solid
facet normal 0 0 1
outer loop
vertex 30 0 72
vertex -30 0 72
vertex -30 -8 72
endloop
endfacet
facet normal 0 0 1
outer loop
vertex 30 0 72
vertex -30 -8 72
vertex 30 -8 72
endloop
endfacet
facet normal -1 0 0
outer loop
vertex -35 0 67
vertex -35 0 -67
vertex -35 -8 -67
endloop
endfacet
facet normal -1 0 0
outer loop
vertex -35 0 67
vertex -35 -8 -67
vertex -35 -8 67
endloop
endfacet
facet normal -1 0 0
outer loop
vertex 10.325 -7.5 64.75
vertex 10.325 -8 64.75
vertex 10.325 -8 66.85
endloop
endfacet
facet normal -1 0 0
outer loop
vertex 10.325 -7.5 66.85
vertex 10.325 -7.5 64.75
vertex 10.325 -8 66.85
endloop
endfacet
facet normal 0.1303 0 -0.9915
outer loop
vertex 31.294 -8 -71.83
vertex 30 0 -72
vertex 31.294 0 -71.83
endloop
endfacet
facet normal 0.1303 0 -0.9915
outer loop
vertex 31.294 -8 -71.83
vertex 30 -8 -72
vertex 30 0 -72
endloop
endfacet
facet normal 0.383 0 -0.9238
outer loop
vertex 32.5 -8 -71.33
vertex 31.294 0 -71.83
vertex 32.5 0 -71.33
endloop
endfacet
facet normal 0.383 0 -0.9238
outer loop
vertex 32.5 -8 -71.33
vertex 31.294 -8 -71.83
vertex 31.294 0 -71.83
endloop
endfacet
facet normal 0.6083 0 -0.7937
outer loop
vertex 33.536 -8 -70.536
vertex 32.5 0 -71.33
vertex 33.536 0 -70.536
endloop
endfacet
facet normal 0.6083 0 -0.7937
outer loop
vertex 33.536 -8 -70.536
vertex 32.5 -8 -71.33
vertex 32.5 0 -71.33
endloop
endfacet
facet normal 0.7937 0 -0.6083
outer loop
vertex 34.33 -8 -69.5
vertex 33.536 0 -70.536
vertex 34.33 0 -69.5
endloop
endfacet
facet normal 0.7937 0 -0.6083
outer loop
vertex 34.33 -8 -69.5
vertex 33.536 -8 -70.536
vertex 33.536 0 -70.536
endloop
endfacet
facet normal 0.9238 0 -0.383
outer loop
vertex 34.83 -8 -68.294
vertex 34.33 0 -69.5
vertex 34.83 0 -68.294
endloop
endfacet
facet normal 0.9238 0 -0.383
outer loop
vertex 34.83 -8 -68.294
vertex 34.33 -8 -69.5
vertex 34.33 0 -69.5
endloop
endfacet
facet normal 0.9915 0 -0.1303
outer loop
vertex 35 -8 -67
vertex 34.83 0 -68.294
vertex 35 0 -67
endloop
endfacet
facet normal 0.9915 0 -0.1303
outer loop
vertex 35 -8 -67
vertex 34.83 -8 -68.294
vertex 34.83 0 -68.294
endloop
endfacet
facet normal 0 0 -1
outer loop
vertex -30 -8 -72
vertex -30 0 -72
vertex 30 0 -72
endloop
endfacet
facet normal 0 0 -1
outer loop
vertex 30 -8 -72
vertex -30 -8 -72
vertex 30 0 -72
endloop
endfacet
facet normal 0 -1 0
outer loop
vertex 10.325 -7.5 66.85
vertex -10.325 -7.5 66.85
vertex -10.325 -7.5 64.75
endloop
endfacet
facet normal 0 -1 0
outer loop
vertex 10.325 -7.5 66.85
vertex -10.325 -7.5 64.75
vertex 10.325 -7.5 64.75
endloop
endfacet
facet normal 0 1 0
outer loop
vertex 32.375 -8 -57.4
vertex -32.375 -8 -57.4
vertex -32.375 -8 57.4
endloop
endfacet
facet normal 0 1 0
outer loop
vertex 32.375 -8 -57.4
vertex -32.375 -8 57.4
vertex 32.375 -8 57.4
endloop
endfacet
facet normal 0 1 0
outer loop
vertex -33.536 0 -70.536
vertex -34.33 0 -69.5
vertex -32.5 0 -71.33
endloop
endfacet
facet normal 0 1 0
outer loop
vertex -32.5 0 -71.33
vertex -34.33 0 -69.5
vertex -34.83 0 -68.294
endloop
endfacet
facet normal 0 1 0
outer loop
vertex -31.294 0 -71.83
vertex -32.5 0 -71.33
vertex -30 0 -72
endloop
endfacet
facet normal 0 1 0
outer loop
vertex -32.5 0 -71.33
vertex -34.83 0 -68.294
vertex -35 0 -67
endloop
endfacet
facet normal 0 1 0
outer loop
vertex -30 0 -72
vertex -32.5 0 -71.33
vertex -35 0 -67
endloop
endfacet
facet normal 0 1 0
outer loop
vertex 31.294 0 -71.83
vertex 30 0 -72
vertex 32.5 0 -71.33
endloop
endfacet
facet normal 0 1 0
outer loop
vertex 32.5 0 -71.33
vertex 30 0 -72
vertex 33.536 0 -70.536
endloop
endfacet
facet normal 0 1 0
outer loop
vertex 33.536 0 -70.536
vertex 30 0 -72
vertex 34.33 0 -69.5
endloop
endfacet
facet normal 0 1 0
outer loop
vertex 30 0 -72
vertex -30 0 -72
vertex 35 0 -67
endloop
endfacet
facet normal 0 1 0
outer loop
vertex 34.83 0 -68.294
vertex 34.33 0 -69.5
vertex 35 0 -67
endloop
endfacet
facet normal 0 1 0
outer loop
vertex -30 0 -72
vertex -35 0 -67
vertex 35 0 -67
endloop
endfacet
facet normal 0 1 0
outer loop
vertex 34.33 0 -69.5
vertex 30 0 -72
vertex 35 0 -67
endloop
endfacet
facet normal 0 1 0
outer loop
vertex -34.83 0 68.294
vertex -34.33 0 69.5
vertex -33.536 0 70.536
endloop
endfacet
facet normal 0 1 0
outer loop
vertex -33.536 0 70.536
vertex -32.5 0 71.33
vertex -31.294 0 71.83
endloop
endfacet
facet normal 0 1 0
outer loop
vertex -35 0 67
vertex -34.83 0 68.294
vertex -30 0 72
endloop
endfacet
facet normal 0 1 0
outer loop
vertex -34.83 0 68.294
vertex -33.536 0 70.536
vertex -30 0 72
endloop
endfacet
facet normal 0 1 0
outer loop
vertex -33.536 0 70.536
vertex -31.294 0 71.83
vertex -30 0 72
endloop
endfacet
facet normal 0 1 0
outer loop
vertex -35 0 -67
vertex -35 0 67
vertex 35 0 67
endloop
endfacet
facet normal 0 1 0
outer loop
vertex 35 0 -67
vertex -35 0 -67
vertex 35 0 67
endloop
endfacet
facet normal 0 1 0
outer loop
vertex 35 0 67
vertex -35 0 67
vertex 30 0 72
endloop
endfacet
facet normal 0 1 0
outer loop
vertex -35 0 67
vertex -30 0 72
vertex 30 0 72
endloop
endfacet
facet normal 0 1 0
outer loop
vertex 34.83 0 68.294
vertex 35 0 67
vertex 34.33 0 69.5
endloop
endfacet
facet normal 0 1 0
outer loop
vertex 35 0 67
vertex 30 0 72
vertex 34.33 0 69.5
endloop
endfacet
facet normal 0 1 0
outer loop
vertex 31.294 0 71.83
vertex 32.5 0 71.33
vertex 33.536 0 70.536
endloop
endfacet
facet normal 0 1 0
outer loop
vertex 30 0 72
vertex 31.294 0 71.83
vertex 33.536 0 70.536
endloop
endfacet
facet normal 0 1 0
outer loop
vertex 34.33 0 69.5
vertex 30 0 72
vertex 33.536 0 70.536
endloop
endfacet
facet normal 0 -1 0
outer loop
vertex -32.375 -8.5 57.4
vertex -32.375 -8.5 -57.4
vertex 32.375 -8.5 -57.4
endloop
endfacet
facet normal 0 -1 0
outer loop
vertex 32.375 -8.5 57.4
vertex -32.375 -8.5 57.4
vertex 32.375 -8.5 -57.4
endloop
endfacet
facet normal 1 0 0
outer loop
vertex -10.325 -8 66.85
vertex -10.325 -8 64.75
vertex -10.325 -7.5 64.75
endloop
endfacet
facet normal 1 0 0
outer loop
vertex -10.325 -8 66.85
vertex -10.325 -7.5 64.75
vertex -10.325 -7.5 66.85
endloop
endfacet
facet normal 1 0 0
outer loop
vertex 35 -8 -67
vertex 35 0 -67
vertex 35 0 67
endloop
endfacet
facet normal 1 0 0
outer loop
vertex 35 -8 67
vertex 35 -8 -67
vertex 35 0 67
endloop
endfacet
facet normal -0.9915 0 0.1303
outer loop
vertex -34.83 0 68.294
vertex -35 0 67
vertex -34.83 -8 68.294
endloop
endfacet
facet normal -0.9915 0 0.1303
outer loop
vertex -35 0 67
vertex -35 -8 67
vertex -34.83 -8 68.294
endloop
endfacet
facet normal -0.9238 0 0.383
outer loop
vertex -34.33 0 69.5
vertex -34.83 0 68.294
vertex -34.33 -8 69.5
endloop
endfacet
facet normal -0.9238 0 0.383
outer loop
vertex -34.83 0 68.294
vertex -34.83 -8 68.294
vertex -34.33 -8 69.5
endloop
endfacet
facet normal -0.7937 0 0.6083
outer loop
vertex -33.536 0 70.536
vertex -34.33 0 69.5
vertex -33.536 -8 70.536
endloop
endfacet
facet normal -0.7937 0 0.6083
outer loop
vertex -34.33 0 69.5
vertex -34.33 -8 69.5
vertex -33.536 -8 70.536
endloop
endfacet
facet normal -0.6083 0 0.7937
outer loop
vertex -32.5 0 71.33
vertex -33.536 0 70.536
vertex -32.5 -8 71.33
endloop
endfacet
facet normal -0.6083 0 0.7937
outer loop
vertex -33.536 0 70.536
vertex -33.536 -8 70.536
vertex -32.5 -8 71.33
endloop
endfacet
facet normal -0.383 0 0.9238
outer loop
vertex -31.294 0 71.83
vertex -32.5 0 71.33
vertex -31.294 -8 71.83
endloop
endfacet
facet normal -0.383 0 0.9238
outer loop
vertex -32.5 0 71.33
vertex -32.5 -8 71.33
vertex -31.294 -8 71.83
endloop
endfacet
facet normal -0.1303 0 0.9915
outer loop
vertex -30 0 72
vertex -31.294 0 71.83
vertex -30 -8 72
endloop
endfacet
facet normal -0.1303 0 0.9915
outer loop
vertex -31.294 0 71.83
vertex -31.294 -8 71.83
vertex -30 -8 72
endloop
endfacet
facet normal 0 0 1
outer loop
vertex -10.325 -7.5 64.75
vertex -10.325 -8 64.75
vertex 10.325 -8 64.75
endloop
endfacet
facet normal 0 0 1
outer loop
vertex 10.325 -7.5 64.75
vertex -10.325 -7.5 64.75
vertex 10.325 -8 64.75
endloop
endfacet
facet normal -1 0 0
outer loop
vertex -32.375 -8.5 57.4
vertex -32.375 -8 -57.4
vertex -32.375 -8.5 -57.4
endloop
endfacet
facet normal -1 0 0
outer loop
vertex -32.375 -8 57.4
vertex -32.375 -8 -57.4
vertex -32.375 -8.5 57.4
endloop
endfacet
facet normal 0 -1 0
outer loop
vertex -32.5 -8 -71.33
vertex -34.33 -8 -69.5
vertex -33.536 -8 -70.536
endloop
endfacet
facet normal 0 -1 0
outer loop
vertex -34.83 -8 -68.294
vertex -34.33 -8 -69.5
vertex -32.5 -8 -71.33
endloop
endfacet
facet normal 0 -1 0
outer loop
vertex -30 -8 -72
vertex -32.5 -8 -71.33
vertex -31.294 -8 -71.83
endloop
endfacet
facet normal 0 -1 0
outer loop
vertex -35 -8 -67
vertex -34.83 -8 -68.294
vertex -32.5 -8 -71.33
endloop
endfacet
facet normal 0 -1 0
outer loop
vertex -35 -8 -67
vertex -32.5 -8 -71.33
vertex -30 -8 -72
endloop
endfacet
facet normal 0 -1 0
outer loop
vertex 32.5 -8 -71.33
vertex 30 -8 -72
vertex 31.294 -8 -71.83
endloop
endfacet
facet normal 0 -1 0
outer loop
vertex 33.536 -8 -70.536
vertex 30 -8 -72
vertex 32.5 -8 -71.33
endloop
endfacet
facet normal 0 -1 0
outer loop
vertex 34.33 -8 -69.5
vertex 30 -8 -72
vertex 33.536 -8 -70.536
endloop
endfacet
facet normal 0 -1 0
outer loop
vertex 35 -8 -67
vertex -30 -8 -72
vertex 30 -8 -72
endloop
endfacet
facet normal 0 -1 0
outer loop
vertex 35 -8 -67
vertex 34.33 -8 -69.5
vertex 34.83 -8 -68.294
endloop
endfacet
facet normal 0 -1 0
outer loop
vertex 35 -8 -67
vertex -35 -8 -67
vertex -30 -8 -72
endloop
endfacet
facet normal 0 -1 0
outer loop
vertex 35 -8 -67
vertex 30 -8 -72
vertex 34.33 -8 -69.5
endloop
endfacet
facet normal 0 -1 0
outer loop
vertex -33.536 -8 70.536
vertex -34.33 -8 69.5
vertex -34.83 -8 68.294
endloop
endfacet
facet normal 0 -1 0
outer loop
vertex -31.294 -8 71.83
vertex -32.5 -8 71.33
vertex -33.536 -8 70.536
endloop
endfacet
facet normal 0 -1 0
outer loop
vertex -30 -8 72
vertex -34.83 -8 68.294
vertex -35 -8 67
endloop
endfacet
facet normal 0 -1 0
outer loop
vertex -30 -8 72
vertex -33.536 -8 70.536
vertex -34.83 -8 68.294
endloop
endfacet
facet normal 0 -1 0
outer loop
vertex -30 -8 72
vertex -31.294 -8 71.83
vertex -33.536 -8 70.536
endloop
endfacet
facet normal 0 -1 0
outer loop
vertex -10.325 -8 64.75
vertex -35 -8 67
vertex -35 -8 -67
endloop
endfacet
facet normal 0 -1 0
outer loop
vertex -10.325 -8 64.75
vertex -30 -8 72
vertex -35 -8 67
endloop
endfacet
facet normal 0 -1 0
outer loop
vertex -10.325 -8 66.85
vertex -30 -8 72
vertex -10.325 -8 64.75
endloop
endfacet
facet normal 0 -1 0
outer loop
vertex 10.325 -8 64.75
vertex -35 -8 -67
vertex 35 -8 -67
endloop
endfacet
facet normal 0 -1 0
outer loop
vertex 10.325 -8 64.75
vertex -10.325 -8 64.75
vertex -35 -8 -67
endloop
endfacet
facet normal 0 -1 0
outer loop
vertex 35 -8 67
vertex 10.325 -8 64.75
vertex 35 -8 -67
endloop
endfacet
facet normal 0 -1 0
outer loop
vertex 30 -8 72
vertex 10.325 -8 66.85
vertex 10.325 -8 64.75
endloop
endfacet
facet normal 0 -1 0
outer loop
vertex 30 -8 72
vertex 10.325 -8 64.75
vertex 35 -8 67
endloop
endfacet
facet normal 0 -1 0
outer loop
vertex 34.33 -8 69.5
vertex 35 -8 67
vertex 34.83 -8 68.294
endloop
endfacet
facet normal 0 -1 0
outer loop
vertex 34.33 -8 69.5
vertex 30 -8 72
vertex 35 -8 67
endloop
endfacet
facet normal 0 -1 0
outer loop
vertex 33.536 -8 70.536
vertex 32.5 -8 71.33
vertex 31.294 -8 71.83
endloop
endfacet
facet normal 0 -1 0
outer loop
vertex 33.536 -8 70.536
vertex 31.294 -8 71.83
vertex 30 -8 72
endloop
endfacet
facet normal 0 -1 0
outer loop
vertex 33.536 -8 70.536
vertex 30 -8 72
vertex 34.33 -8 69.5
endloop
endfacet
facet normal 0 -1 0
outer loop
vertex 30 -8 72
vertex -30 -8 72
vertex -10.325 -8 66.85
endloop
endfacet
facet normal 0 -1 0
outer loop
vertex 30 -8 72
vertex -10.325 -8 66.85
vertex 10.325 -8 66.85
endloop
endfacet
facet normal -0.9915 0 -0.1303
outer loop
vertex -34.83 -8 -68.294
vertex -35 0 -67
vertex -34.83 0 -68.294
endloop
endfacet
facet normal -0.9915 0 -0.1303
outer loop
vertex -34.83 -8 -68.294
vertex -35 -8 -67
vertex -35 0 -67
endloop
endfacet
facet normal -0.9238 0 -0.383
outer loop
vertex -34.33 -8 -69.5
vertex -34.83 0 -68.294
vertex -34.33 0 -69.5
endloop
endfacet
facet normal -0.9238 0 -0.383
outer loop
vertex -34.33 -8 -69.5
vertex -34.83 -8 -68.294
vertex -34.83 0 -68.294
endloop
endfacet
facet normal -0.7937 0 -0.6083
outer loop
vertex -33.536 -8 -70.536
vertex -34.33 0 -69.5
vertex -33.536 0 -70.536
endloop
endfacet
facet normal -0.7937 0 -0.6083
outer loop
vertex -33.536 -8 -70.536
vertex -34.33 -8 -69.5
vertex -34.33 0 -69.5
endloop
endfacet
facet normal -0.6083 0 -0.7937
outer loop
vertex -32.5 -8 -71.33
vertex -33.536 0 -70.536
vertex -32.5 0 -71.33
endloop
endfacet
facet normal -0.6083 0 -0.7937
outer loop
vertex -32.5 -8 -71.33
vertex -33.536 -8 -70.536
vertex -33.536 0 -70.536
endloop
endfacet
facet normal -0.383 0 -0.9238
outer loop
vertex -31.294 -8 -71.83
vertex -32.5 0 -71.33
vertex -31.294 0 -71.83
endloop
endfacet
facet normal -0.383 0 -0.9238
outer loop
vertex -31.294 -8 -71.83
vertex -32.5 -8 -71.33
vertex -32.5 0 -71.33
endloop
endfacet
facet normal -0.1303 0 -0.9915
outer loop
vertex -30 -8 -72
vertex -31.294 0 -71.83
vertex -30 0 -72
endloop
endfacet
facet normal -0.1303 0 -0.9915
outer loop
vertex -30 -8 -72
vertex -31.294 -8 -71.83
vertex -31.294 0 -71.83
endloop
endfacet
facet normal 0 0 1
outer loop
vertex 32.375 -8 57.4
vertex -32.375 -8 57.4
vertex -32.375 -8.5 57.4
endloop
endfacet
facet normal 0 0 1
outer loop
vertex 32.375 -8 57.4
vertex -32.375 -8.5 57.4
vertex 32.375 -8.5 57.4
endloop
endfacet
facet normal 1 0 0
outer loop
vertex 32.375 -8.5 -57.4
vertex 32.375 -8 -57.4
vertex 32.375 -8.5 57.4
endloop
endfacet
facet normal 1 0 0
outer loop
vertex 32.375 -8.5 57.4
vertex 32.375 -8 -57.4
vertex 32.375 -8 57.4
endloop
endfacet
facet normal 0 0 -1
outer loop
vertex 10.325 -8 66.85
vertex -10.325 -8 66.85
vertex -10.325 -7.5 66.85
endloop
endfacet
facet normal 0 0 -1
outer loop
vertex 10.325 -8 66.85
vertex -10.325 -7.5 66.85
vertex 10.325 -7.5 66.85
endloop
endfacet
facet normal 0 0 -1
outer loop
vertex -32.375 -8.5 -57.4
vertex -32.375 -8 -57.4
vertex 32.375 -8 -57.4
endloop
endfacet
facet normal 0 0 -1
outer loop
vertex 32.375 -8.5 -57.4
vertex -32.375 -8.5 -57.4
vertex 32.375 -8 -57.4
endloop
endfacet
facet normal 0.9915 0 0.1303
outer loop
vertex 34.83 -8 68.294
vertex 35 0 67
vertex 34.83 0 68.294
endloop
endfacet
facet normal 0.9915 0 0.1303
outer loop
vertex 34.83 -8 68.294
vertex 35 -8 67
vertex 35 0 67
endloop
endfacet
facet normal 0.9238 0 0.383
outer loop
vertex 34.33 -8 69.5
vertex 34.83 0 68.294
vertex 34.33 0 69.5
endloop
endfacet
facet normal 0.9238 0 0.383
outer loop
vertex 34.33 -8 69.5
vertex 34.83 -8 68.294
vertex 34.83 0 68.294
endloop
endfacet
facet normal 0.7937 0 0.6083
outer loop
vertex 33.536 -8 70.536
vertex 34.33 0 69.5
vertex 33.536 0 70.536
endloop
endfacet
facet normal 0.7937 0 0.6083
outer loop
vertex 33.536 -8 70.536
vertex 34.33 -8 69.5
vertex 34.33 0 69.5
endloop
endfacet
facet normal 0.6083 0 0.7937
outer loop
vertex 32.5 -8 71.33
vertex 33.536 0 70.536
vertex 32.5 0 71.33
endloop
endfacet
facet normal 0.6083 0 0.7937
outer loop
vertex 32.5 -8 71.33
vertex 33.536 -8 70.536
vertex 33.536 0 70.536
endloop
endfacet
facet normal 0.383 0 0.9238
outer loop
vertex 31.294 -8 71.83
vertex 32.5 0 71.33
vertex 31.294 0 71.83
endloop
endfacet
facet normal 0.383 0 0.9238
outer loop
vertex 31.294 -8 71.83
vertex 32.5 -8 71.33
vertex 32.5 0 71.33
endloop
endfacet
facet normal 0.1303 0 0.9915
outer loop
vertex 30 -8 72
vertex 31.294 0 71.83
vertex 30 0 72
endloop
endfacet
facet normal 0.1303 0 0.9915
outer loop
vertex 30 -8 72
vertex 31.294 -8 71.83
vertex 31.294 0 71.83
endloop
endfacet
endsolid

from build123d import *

# Parameters (mm, degrees)
F0_W     = 70
F0_H     = 144
F1_DEPTH = 8
F2_R     = 5
F3_W     = 64.75
F3_H     = 114.799998
F4_DEPTH = 0.5
F3_W_2   = 20.650004
F3_H_2   = 2.100006
F5_DEPTH = 0.5


with BuildPart() as f1:
    # F0 (on Front) → F1 (new body)
    with BuildSketch(Plane.XZ):
        Rectangle(F0_W, F0_H)
    extrude(amount=F1_DEPTH)

    # F2
    f2_edges = [f1.edges().sort_by_distance(p)[0] for p in [
        (-35, -4, 72),
        (35, -4, 72),
        (35, -4, -72),
        (-35, -4, -72),
    ]]
    fillet(f2_edges, radius=F2_R)

    # F3 (on face) → F5 (cut)
    with BuildSketch(Plane.XZ.offset(8)):
        with Locations((0, 65.800004)):
            Rectangle(F3_W_2, F3_H_2)
    extrude(amount=-F5_DEPTH, mode=Mode.SUBTRACT)


with BuildPart() as f4:
    # F3 (on face) → F4 (new body)
    with BuildSketch(Plane.XZ.offset(8)):
        Rectangle(F3_W, F3_H)
    extrude(amount=F4_DEPTH)


solid = Compound([f1.part, f4.part])
